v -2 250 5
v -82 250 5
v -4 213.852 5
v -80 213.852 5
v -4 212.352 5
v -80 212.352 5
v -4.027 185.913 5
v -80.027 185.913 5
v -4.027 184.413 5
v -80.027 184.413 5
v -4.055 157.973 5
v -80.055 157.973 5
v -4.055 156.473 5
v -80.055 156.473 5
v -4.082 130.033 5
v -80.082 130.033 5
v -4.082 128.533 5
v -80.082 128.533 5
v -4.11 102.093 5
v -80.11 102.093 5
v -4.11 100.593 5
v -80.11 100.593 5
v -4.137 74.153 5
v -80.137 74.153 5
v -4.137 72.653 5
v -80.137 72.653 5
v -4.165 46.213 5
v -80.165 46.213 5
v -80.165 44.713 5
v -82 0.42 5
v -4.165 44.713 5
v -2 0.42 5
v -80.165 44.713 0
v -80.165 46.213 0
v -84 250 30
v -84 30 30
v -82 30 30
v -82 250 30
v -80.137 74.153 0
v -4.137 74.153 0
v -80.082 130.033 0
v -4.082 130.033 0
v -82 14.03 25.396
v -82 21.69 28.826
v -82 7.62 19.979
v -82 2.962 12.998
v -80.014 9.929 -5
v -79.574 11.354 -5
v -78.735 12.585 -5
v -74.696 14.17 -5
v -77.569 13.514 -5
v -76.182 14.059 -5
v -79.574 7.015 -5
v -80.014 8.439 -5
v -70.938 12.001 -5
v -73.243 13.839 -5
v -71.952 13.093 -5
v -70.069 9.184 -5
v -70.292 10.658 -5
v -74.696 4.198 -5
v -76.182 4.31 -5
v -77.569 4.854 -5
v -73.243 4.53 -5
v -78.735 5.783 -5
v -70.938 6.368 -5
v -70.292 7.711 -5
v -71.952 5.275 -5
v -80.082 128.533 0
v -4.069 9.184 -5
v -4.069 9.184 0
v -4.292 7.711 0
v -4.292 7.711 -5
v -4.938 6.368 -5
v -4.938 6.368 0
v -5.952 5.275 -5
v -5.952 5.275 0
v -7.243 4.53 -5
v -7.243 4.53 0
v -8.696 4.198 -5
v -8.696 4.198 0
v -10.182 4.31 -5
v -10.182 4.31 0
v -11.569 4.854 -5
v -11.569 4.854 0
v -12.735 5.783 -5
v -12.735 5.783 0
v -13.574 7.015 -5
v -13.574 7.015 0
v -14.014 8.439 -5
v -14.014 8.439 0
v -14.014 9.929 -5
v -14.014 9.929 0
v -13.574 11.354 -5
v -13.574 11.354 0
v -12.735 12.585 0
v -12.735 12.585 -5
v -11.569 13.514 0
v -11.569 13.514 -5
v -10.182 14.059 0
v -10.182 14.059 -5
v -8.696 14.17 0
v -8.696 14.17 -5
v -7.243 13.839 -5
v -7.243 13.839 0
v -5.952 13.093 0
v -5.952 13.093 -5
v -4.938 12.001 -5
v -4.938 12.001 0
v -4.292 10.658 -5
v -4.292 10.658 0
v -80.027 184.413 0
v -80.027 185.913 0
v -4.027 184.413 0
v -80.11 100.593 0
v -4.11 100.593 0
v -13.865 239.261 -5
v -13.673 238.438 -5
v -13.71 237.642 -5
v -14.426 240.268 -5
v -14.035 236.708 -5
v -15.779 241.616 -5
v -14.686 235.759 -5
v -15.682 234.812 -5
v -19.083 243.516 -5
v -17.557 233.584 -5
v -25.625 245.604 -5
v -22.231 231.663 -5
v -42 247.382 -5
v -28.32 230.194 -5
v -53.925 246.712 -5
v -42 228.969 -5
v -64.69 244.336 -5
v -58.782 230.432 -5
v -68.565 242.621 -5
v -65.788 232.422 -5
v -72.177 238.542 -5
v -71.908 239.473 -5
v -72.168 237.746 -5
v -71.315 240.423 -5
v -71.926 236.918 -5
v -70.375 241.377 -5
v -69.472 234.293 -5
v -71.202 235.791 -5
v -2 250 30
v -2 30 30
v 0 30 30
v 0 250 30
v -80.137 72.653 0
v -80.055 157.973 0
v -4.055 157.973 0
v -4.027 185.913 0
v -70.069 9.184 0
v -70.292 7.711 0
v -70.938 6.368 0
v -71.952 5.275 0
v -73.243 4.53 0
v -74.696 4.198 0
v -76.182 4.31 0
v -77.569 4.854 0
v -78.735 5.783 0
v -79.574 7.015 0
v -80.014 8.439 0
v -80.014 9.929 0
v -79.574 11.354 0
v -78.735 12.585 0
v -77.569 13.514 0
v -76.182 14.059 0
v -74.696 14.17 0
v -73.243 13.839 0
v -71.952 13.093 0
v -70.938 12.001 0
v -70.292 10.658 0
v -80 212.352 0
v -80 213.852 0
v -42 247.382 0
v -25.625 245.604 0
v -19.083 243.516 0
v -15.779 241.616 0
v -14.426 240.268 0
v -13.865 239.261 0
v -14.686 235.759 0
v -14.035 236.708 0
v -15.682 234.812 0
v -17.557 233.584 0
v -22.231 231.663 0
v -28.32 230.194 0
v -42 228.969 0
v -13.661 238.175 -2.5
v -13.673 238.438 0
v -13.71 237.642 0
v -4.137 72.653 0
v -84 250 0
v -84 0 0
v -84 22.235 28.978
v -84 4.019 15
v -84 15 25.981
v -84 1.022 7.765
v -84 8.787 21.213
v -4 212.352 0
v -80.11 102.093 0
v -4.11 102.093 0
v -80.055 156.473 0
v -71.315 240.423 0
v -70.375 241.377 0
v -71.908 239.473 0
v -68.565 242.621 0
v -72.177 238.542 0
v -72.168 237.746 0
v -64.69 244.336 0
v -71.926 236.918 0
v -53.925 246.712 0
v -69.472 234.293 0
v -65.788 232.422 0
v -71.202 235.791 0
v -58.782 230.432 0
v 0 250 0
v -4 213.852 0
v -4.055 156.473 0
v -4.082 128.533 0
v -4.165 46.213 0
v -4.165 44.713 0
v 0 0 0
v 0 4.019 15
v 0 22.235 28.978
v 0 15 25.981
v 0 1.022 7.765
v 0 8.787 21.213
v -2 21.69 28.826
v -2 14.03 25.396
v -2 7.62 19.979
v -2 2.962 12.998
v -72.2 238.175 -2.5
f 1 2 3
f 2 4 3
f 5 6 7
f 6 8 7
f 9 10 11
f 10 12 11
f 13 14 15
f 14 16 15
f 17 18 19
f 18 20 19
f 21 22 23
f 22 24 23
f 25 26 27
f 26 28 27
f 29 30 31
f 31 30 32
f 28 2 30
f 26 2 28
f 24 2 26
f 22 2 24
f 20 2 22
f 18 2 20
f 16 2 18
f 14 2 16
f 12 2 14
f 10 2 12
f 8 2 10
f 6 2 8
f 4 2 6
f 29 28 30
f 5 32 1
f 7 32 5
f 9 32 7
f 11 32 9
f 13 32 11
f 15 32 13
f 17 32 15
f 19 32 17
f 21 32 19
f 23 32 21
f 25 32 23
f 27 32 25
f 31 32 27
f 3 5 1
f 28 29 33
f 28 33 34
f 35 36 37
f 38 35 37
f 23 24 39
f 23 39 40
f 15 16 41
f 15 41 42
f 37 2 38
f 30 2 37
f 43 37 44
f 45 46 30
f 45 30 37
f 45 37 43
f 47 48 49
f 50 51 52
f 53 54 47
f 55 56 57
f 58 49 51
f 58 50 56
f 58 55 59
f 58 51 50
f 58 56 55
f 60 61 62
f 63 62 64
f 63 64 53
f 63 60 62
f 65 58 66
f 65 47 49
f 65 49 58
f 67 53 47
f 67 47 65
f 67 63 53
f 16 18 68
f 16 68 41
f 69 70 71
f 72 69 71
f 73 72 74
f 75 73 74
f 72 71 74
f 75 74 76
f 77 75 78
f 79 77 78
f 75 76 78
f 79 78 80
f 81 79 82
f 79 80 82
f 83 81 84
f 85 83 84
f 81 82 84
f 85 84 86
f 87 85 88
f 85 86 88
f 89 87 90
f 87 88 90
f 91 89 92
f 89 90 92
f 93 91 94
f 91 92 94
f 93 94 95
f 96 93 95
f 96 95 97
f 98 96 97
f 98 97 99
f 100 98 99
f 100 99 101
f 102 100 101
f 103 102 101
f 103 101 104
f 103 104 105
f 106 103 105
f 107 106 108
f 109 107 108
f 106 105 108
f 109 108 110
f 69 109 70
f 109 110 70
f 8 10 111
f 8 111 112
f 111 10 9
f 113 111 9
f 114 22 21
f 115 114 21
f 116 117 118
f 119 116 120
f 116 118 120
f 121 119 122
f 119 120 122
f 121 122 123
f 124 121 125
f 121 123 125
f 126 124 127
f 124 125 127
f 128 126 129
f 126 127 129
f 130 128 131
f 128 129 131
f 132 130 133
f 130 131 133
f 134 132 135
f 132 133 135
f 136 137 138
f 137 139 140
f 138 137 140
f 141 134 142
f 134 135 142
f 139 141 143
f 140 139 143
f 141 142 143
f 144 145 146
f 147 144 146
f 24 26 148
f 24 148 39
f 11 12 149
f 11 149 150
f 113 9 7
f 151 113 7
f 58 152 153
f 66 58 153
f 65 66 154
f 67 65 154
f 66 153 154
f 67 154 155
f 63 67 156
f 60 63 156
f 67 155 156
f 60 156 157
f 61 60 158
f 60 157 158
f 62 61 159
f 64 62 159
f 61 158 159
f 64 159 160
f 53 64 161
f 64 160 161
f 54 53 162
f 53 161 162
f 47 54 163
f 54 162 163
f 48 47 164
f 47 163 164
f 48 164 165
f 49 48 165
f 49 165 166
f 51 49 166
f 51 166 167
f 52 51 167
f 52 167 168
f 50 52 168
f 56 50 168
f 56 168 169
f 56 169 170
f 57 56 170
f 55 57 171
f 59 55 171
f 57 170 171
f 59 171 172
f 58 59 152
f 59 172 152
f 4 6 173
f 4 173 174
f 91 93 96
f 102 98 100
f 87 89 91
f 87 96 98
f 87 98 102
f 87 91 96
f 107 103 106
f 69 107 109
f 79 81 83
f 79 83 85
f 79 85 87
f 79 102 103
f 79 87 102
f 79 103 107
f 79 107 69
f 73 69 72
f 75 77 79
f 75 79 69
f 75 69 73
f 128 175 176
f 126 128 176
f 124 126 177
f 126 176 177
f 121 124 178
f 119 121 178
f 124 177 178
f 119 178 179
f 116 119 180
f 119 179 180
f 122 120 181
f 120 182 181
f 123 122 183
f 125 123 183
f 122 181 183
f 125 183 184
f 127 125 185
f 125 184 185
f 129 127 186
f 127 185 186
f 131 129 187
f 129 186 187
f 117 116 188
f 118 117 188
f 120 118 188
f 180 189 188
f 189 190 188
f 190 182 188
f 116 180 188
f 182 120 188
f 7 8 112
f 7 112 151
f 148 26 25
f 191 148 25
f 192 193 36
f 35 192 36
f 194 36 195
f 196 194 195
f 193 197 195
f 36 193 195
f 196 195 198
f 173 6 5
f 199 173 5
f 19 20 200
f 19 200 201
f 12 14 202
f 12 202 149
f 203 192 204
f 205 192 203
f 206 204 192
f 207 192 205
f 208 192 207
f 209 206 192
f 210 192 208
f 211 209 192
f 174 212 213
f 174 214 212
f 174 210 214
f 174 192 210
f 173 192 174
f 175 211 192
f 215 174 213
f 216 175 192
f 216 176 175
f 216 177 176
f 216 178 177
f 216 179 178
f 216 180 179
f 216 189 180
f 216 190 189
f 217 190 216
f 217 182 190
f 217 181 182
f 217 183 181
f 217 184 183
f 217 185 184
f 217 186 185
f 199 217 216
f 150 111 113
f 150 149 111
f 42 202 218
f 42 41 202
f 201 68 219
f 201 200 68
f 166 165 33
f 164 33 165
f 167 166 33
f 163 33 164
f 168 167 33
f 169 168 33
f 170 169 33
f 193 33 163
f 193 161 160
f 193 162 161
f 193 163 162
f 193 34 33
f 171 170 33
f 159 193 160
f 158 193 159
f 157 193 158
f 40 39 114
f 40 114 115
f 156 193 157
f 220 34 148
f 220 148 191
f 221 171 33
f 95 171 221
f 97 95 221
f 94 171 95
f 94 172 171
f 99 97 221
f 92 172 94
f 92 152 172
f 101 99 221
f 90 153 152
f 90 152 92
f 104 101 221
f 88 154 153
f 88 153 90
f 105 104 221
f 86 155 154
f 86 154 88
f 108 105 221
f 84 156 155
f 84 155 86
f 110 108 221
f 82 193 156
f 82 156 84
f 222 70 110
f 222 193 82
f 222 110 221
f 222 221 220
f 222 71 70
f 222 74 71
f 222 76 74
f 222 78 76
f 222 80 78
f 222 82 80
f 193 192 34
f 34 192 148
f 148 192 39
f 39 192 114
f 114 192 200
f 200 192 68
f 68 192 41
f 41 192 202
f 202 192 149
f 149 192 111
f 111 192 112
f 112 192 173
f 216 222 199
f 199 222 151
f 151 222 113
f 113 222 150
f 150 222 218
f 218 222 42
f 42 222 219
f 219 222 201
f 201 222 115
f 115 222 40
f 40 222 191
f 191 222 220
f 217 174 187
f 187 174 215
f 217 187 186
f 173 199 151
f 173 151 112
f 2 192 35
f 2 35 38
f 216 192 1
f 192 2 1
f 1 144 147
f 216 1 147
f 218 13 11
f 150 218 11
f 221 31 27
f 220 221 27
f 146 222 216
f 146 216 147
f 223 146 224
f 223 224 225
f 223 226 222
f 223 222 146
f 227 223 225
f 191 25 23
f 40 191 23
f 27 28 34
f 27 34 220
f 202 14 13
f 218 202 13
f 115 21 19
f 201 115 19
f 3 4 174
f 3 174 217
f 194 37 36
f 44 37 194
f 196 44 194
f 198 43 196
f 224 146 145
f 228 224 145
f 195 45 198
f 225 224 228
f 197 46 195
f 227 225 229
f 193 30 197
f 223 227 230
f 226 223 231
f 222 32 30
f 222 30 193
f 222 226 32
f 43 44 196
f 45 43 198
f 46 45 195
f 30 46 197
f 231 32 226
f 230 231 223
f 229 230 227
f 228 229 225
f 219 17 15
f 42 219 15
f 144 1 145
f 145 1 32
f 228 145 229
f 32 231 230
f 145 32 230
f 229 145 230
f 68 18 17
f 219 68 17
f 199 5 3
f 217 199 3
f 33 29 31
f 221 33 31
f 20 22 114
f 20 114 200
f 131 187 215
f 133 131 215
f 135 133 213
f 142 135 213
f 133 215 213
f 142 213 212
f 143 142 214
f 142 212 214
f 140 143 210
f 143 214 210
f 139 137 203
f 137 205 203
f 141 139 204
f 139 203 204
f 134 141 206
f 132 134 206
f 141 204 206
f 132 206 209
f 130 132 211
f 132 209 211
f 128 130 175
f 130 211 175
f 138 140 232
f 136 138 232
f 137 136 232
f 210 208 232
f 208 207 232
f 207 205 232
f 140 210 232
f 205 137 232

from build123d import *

# Parameters (mm, degrees)
F0_W     = 84
F0_H     = 30
F1_DEPTH = 250
F2_W     = 80
F2_H     = 50.6085516345
F3_DEPTH = 250.001
F4_R     = 5
F5_DEPTH = 5
F6_W     = 76
F6_H     = 1.5
F7_DEPTH = 25.4
F8_F1_R  = 29.9999


# Not quite as in the source:
# - a fillet or chamfer is up to 0.001 mm smaller than in the source, because OpenCascade refuses the exact size


with BuildPart() as f1:
    # F0 (on Front) → F1 (new body)
    with BuildSketch(Plane.XZ):
        with Locations((-42, 15)):
            Rectangle(F0_W, F0_H)
    extrude(amount=-F1_DEPTH)

    # F2 (on Front) → F3 (cut, through all)
    with BuildSketch(Plane.XZ):
        with Locations((-42, 30.3042758173)):
            Rectangle(F2_W, F2_H)
    extrude(amount=-F3_DEPTH, mode=Mode.SUBTRACT)

    # F4 (on face) → F5 (join)
    with BuildSketch(Plane(origin=(0, 0, 0), x_dir=(1, 0, 0), z_dir=(0, 0, -1))):
        with Locations((-75.0694796443, -9.1842794791)):
            Circle(F4_R)
        with Locations((-9.0694796443, -9.1842794791)):
            Circle(F4_R)
        with BuildLine():
            add(Edge.make_bspline(
                [(-42, -228.9691147673), (-42, -236.5294238205), (-42, -242.7407619737), (-42, -247.3817589414)],
                knots=[0.7062379003, 0.7062379003, 0.7062379003, 0.7062379003, 0.8221337183, 0.8221337183, 0.8221337183, 0.8221337183], degree=3))
            add(Edge.make_bspline(
                [(-42, -228.9691147673), (-72.1999239177, -228.6668722572), (-72.1999239177, -238.1754368544), (-72.1999239177, -247.6840014516), (-42, -247.3817589414)],
                knots=[1.5390046272, 1.5390046272, 1.5390046272, 3.1415926536, 3.1415926536, 4.74418068, 4.74418068, 4.74418068], degree=2, weights=[1, 0.695777858, 1, 0.695777858, 1]))
        make_face()
        with BuildLine():
            add(Edge.make_bspline(
                [(-42, -247.3817589414), (-13.660820201, -247.0981388613), (-13.660820201, -238.1754368544)],
                knots=[4.74418068, 4.74418068, 4.74418068, 6.2831853072, 6.2831853072, 6.2831853072], degree=2, weights=[1, 0.7182570377, 1]))
            add(Edge.make_bspline(
                [(-13.660820201, -238.1754368544), (-13.660820201, -229.2527348474), (-42, -228.9691147673)],
                knots=[0, 0, 0, 1.5390046272, 1.5390046272, 1.5390046272], degree=2, weights=[1, 0.7182570377, 1]))
            add(Edge.make_bspline(
                [(-42, -228.9691147673), (-42, -236.5294238205), (-42, -242.7407619737), (-42, -247.3817589414)],
                knots=[0.7062379003, 0.7062379003, 0.7062379003, 0.7062379003, 0.8221337183, 0.8221337183, 0.8221337183, 0.8221337183], degree=3))
        make_face()
    extrude(amount=F5_DEPTH)

    # F6 (on face) → F7 (cut)
    with BuildSketch(Plane.XY.offset(5)):
        with Locations((-42, 213.1024897098)):
            Rectangle(F6_W, F6_H)
        with Locations((-42.0274770269, 185.1625032207)):
            Rectangle(F6_W, F6_H)
        with Locations((-42.0549540537, 157.2225167316)):
            Rectangle(F6_W, F6_H)
        with Locations((-42.1648621612, 45.462570775)):
            Rectangle(F6_W, F6_H)
        with Locations((-42.1373851343, 73.4025572642)):
            Rectangle(F6_W, F6_H)
        with Locations((-42.1099081074, 101.3425437533)):
            Rectangle(F6_W, F6_H)
        with Locations((-42.0824310806, 129.2825302424)):
            Rectangle(F6_W, F6_H)
    extrude(amount=-F7_DEPTH, mode=Mode.SUBTRACT)

    # F8: fillet of radius 30 on 2 edges, made by hand

    # F8_f1 (radius 30 in the source; OpenCascade refuses exactly that, so slightly less here)
    f8_f1_edges = [f1.edges().sort_by_distance(p)[0] for p in [
        (-83, 0, 30),
    ]]
    fillet(f8_f1_edges, radius=F8_F1_R)


solid = f1.part
